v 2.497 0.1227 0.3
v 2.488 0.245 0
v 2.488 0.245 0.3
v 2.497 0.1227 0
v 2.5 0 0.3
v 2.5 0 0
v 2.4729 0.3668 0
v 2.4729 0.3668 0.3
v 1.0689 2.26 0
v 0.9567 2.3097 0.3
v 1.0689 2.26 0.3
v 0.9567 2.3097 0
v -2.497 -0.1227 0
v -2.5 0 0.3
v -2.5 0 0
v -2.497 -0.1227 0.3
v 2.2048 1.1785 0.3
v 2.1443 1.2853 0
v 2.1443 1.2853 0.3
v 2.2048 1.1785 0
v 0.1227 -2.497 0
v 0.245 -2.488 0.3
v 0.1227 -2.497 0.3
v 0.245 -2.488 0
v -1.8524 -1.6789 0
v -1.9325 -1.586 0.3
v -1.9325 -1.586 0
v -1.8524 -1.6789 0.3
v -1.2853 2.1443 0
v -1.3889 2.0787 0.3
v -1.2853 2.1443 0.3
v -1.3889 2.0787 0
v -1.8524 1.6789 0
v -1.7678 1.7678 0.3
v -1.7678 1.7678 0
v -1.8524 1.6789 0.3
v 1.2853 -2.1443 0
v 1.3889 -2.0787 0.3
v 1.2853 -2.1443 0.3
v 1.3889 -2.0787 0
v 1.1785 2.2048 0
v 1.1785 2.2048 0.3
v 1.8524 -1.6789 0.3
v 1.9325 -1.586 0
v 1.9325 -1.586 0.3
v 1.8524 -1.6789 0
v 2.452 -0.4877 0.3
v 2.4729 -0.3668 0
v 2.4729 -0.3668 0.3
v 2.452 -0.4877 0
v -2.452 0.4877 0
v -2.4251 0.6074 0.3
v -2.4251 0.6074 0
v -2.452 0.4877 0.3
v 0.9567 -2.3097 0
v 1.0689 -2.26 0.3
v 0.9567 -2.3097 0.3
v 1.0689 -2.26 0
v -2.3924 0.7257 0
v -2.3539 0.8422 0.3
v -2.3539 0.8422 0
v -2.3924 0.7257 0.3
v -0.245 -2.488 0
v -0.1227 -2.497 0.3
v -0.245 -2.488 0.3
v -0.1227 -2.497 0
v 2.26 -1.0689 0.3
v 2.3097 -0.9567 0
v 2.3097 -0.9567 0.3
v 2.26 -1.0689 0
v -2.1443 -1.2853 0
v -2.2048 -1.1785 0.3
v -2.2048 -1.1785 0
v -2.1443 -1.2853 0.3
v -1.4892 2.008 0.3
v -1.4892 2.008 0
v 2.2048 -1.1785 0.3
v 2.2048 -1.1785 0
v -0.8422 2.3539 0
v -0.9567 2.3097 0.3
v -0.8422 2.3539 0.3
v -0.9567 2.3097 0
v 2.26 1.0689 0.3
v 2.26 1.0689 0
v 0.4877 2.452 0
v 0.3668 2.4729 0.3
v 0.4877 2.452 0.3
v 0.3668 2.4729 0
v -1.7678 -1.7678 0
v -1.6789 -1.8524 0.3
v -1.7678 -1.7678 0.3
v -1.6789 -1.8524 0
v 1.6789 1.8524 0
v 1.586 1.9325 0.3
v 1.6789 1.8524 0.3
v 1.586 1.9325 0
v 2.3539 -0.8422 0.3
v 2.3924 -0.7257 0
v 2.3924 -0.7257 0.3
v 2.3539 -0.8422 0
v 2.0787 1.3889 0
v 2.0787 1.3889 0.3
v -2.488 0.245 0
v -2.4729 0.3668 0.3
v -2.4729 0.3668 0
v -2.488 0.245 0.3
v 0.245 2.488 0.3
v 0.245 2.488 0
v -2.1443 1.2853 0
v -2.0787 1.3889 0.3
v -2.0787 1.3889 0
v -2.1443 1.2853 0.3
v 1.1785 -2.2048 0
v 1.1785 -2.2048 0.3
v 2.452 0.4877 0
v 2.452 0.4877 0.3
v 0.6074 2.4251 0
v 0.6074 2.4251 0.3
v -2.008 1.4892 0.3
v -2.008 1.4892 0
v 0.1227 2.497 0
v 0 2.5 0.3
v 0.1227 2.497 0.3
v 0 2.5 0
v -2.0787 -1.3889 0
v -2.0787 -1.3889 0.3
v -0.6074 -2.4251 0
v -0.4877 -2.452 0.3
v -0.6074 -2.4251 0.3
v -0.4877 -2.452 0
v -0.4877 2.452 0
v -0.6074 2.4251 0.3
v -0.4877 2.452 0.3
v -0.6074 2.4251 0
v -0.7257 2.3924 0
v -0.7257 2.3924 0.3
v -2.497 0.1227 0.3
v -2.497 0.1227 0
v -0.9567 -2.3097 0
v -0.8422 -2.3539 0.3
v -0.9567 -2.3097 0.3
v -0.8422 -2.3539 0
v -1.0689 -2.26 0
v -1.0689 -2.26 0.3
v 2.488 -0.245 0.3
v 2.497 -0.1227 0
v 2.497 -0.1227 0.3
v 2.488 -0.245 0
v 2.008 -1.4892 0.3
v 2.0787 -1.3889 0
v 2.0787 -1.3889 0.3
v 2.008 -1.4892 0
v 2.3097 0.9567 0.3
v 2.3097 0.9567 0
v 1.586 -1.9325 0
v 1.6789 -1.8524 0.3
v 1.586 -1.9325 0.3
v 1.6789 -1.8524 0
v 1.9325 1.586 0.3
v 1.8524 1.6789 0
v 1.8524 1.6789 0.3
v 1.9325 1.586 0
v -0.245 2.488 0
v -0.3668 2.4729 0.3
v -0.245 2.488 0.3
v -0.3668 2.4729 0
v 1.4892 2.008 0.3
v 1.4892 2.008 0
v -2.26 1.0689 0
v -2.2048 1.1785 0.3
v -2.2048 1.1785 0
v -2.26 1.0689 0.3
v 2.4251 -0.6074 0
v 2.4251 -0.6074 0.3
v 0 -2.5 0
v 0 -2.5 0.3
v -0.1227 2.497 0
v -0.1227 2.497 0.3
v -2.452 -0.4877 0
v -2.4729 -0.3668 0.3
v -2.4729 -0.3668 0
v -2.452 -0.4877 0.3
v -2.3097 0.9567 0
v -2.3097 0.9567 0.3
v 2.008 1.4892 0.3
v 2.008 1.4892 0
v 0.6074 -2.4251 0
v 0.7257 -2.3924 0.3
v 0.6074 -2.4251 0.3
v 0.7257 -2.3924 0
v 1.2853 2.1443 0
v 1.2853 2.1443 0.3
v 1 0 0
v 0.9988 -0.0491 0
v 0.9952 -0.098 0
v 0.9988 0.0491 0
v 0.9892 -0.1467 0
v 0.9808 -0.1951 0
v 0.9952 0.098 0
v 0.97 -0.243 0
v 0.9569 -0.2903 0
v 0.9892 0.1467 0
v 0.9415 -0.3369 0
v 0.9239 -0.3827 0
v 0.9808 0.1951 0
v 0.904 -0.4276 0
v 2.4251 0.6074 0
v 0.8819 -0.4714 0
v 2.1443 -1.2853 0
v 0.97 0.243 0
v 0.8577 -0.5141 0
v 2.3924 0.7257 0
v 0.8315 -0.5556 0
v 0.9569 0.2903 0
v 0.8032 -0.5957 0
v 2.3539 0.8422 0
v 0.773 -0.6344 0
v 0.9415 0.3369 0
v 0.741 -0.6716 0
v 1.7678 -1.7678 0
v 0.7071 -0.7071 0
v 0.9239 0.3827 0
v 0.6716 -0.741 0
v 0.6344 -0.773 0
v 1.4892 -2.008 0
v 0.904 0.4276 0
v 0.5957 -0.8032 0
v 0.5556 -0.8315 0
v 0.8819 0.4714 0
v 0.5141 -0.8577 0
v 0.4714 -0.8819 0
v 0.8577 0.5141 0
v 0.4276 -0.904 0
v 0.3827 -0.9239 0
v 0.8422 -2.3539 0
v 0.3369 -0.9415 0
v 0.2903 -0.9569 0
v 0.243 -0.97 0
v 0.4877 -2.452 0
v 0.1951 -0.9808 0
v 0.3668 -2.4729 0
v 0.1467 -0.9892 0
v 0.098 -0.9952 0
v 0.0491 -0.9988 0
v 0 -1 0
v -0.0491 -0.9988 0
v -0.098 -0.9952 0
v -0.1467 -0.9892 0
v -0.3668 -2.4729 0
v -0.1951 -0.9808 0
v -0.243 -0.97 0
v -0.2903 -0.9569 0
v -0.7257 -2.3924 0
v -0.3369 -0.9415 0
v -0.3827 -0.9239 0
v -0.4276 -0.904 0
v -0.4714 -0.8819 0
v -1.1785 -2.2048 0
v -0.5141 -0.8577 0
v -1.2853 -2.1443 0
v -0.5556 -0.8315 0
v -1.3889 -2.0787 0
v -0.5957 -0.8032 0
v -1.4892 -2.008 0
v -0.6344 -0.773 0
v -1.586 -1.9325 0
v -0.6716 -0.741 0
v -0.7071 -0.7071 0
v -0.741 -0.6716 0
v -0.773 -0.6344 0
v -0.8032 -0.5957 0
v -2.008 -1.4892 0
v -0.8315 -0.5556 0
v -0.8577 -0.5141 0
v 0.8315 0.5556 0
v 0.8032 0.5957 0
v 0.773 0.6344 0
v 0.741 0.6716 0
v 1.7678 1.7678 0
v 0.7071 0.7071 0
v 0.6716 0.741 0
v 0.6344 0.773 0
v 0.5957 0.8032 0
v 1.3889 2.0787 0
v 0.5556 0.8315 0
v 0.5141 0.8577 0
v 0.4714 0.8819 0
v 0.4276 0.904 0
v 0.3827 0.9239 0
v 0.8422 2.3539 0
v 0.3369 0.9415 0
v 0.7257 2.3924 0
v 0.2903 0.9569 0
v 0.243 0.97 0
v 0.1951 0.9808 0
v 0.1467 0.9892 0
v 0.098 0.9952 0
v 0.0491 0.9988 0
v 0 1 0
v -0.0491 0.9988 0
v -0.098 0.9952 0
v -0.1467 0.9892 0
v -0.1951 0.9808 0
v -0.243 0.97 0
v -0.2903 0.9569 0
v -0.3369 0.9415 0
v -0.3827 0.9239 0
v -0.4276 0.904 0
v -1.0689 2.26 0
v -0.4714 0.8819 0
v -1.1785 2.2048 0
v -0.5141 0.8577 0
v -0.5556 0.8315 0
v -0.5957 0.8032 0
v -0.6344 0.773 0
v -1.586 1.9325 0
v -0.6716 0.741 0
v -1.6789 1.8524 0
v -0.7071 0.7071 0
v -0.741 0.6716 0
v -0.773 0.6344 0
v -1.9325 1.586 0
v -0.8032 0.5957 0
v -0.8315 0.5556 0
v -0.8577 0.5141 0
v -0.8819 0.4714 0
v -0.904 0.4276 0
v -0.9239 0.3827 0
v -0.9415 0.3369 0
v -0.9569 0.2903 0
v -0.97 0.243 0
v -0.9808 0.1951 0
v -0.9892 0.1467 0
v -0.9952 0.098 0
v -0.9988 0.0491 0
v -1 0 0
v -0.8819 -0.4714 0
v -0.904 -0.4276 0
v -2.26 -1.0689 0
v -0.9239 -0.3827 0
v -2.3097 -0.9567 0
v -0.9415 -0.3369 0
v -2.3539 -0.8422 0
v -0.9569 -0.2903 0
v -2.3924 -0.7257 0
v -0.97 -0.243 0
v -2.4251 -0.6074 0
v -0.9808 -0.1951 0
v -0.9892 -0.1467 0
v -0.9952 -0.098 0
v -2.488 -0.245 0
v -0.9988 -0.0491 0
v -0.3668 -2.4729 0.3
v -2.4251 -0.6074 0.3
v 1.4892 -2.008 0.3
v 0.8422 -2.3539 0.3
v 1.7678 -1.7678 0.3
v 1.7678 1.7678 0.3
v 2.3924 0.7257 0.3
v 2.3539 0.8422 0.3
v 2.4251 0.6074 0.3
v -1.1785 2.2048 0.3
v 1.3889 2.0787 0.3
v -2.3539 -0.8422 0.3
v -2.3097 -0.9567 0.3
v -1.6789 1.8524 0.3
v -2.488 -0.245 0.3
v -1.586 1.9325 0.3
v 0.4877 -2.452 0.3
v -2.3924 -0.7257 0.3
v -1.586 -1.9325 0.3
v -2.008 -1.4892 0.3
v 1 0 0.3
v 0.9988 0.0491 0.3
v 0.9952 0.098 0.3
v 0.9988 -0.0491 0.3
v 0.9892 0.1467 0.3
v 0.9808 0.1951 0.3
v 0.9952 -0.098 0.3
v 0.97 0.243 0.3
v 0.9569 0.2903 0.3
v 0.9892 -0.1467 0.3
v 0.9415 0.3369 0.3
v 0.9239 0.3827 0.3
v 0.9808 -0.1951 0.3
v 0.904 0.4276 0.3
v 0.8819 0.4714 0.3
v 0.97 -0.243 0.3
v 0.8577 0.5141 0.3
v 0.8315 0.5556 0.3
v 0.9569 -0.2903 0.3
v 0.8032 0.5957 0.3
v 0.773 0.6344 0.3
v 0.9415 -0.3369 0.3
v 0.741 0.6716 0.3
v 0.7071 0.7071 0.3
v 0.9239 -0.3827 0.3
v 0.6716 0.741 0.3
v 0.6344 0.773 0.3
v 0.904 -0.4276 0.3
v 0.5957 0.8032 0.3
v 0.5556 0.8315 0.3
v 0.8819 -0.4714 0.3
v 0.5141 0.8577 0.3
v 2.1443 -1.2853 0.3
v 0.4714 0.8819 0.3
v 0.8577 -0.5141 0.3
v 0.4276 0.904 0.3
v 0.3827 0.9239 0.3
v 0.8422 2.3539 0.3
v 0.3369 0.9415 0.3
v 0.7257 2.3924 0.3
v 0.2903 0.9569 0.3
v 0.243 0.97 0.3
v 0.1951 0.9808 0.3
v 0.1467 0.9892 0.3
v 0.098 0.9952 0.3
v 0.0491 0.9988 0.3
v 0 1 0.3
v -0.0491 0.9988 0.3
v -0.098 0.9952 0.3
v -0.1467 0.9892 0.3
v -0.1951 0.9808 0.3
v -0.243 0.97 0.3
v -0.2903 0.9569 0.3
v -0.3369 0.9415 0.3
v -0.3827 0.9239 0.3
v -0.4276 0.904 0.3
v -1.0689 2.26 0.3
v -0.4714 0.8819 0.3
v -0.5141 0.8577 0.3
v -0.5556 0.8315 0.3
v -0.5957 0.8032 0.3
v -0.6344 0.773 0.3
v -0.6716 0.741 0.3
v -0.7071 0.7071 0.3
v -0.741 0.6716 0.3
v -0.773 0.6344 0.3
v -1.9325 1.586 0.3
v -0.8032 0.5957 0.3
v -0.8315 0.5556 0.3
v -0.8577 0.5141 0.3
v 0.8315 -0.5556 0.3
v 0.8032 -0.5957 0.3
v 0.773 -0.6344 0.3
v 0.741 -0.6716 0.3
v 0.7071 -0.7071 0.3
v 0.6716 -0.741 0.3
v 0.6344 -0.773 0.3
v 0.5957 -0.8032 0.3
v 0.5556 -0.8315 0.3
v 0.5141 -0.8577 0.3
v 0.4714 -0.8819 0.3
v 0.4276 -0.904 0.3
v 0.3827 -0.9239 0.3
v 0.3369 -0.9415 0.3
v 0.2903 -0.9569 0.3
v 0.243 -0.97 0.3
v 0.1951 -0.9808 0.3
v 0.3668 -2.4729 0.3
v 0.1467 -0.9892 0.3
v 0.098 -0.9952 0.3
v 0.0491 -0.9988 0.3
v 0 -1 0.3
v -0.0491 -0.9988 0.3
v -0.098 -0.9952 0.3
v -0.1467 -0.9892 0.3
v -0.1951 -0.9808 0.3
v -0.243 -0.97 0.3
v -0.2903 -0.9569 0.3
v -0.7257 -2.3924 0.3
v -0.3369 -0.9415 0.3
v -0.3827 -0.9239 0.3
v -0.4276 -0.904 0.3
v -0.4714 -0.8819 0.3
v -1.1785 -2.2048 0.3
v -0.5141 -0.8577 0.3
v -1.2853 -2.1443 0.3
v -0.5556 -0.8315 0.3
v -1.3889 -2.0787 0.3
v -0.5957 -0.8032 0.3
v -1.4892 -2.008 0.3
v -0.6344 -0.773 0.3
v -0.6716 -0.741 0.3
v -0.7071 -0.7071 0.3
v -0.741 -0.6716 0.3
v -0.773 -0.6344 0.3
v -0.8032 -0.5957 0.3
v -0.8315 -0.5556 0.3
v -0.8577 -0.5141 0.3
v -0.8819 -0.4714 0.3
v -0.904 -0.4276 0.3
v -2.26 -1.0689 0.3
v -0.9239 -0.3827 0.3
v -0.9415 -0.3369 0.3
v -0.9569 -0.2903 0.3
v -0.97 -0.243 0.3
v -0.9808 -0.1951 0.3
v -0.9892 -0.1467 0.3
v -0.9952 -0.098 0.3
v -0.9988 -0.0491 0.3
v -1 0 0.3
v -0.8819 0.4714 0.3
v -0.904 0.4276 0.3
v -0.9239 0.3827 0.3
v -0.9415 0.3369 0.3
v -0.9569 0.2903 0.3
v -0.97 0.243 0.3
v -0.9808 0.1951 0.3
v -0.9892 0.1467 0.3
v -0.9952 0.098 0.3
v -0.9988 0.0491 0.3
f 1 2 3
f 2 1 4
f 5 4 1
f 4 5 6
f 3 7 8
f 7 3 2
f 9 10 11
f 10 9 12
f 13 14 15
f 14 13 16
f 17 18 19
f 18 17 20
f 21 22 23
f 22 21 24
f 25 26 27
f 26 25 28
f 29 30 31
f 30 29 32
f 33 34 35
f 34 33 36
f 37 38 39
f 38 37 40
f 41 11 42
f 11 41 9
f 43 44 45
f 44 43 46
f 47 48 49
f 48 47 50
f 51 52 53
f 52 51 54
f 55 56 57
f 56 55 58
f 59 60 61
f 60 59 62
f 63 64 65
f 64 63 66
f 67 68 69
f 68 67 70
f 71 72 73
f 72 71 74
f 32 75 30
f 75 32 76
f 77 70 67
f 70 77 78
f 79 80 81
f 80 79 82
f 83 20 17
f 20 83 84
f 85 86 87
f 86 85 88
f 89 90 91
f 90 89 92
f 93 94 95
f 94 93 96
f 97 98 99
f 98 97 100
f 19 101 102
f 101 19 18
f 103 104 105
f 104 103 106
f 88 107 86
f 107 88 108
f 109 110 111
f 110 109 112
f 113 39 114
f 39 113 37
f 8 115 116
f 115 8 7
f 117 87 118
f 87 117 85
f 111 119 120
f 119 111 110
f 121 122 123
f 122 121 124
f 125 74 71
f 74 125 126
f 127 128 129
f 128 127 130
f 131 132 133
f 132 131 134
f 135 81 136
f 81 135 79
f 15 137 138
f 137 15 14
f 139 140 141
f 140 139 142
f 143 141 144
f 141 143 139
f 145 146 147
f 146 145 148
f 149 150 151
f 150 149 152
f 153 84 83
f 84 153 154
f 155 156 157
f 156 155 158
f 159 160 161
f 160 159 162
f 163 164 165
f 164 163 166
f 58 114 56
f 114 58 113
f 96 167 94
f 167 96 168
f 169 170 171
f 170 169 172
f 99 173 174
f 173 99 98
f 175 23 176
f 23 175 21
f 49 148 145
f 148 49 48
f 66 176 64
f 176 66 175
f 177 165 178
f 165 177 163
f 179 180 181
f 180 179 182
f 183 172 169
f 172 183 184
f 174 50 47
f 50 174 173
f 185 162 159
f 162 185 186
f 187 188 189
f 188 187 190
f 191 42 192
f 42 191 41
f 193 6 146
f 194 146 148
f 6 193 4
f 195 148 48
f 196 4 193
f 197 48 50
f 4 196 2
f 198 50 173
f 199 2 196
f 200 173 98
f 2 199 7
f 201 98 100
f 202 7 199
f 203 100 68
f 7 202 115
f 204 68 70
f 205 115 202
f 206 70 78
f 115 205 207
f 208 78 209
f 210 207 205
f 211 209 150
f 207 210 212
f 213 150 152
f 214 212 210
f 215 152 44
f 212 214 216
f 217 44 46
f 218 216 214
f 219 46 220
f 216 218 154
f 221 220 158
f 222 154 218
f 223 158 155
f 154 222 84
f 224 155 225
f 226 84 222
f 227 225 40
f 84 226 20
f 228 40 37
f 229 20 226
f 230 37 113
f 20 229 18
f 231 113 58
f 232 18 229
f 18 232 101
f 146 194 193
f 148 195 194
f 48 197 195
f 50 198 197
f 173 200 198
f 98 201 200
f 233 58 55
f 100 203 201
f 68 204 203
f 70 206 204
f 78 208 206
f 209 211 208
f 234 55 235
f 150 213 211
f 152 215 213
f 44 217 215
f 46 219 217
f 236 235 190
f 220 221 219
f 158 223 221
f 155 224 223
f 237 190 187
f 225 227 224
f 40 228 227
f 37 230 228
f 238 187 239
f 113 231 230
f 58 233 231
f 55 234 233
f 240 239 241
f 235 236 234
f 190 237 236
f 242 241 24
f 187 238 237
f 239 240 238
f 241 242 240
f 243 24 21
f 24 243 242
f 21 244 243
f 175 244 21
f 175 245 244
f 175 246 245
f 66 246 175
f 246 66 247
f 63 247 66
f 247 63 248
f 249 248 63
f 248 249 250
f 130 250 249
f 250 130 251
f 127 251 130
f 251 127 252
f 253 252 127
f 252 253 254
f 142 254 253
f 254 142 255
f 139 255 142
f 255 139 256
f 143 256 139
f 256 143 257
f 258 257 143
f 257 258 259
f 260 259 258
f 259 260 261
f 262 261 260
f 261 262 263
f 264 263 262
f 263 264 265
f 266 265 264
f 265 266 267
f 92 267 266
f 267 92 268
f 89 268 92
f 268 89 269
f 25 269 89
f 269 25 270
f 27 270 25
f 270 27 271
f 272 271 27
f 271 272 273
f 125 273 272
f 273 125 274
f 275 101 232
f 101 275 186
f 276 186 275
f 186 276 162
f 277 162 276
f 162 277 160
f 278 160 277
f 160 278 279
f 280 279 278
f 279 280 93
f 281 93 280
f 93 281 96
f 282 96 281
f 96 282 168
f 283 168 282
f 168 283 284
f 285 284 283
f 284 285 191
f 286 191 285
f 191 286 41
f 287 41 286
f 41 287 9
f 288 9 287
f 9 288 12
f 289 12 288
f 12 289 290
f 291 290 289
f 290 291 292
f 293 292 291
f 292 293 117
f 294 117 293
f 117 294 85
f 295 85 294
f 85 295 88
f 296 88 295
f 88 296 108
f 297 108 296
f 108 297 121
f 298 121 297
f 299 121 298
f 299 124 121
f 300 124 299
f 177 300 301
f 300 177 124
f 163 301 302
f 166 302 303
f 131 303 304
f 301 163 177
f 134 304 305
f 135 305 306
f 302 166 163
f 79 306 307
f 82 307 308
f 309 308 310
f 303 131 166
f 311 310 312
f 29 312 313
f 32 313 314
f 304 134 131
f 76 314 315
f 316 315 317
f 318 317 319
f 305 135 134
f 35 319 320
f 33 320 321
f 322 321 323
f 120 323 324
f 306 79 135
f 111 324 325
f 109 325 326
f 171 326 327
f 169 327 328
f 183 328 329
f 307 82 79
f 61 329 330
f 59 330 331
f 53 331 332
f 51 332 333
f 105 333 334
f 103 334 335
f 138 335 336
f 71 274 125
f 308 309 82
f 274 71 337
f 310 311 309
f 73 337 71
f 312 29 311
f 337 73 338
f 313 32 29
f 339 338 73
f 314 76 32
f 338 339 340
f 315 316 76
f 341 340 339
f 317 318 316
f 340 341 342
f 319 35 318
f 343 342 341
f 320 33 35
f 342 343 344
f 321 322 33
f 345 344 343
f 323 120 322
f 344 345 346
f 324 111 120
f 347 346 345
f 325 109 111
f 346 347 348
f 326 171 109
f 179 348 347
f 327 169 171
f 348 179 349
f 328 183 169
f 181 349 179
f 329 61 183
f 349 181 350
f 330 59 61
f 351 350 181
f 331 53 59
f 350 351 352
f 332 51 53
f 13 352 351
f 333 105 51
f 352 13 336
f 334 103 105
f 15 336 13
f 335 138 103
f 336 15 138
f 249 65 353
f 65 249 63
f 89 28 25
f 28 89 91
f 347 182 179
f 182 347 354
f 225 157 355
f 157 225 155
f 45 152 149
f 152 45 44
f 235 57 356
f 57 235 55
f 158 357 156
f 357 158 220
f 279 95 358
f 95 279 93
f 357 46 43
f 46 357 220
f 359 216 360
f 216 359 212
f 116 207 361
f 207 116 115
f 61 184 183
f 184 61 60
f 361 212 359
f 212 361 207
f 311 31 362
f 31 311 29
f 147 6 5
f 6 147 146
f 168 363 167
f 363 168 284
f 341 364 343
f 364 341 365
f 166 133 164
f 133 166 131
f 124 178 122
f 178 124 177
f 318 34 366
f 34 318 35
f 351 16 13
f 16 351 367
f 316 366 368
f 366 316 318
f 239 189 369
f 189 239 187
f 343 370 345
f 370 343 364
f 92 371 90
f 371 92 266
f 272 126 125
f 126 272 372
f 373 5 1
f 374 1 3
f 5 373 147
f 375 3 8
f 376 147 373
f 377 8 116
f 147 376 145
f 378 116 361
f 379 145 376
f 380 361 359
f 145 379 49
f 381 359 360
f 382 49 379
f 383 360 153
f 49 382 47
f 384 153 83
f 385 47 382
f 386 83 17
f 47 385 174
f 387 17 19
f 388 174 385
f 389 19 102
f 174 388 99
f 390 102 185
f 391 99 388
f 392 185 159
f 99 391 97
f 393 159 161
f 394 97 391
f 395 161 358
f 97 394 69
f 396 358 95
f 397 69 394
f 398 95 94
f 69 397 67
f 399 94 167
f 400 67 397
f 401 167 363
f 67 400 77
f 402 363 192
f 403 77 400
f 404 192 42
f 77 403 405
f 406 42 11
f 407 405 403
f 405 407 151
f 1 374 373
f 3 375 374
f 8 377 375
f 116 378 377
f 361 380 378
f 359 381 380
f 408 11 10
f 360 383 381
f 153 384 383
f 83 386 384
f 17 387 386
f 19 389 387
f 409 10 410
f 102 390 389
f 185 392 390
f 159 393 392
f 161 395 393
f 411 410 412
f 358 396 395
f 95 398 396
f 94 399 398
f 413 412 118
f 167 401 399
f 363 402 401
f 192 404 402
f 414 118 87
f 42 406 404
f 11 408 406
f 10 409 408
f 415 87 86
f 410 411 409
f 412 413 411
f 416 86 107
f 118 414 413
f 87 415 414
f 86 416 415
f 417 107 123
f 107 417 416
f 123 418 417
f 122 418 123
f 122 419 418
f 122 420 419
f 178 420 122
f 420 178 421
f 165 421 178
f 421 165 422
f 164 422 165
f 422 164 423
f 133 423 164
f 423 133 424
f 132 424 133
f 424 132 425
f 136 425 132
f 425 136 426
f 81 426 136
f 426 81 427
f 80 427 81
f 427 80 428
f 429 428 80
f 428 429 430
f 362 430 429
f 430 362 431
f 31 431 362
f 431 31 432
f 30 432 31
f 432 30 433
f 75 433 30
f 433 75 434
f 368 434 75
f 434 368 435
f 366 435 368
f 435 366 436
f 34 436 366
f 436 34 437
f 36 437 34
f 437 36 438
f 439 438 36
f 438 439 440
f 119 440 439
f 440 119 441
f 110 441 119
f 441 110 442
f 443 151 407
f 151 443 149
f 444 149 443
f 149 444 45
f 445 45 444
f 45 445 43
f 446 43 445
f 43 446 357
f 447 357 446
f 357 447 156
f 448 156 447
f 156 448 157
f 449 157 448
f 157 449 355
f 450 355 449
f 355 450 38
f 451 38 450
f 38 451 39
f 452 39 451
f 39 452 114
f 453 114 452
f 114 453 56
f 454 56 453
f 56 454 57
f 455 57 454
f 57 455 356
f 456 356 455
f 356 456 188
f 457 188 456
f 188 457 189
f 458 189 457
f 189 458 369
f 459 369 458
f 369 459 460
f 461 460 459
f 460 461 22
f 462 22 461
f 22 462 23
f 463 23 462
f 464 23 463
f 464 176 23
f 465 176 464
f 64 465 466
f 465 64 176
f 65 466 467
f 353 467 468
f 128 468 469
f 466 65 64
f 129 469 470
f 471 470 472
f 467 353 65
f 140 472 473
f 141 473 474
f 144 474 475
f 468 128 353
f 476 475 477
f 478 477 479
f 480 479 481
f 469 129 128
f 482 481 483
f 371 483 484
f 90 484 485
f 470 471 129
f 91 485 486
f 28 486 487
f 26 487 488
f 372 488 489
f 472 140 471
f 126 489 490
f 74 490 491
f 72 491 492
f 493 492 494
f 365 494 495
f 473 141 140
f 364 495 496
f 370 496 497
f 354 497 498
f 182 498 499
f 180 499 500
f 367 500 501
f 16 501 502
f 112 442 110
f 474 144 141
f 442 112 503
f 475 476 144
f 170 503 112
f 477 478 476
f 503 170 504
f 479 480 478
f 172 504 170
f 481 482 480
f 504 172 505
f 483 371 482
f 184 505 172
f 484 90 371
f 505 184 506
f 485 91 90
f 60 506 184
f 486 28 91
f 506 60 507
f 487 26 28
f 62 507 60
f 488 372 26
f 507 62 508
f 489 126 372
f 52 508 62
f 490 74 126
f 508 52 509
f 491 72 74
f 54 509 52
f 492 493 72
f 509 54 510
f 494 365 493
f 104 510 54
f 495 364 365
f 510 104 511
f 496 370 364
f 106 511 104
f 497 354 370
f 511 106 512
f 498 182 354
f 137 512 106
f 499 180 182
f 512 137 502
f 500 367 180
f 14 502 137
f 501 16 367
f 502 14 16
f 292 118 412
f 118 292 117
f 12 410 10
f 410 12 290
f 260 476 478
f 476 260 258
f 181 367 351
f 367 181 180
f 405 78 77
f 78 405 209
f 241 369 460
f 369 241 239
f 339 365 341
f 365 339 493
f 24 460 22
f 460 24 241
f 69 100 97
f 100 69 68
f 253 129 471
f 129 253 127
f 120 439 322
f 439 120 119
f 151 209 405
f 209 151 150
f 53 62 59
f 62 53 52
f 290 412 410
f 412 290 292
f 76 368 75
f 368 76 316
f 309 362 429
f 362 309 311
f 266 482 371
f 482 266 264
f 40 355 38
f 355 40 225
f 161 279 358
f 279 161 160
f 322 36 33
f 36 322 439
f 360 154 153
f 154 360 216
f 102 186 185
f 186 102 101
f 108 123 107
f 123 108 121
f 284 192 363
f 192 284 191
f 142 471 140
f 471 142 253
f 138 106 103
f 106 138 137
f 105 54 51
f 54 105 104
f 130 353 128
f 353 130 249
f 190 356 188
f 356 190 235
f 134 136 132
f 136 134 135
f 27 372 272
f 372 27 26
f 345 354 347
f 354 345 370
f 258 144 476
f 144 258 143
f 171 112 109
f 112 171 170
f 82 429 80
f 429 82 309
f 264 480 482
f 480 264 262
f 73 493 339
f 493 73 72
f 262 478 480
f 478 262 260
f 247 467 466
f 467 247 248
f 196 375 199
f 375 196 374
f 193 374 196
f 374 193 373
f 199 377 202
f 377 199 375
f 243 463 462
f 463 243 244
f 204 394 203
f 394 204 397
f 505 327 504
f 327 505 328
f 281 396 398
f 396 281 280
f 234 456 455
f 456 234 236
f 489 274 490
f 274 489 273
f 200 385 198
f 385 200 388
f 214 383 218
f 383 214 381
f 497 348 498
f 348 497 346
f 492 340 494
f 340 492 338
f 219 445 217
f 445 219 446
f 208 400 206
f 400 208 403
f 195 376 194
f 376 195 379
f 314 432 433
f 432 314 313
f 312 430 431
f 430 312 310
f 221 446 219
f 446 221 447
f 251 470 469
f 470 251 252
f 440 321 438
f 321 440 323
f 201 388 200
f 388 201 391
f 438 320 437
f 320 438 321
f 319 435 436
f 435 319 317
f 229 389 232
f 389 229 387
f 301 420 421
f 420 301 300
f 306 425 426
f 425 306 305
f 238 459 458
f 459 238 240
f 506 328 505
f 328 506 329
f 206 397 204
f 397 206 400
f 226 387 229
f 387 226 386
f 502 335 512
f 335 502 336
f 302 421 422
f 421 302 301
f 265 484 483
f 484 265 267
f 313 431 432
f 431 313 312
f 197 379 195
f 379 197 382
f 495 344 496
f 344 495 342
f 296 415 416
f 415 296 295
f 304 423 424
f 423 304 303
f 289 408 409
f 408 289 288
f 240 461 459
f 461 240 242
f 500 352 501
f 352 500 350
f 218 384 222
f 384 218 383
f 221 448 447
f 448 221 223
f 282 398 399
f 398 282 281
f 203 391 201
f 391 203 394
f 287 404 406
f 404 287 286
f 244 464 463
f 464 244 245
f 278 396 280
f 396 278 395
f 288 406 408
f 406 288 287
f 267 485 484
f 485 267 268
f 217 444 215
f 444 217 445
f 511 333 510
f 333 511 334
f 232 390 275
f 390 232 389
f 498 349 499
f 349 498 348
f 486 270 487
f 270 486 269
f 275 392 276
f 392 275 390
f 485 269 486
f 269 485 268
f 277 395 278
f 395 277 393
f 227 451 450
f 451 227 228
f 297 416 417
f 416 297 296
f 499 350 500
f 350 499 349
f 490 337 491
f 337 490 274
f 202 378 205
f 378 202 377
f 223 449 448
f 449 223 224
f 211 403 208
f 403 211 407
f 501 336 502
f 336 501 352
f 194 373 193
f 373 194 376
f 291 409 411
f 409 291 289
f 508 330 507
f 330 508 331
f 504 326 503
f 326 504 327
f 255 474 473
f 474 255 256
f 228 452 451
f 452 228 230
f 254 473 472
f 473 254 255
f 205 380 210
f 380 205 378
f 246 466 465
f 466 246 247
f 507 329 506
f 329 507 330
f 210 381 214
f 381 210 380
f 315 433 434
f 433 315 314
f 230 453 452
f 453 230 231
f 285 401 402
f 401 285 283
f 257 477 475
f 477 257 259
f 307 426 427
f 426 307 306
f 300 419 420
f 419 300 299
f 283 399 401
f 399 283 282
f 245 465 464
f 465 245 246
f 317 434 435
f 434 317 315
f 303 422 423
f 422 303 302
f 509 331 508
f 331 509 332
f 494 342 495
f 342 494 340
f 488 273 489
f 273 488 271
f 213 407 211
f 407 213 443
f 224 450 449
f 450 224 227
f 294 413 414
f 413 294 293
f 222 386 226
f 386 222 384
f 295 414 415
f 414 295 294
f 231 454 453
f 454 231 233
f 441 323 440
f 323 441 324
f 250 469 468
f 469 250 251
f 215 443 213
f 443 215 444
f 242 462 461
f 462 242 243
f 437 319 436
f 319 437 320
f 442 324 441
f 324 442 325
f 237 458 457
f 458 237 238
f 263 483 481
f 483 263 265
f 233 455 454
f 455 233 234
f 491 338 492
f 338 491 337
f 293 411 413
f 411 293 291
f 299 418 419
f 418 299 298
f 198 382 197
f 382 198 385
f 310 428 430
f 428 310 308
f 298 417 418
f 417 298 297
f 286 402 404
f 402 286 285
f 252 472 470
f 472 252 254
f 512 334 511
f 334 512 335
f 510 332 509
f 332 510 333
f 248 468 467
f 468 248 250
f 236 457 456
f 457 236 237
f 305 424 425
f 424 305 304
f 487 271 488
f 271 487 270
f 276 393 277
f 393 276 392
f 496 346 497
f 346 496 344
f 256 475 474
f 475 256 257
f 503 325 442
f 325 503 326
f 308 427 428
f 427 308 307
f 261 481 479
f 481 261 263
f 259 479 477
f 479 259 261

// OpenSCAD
$fn = 128;

inner_d = 2.0;
outer_d = 5.0;
thickness = 0.3;

difference() {
  cylinder(d = outer_d, h = thickness);
  cylinder(d = inner_d, h = thickness + 0.2);
}
